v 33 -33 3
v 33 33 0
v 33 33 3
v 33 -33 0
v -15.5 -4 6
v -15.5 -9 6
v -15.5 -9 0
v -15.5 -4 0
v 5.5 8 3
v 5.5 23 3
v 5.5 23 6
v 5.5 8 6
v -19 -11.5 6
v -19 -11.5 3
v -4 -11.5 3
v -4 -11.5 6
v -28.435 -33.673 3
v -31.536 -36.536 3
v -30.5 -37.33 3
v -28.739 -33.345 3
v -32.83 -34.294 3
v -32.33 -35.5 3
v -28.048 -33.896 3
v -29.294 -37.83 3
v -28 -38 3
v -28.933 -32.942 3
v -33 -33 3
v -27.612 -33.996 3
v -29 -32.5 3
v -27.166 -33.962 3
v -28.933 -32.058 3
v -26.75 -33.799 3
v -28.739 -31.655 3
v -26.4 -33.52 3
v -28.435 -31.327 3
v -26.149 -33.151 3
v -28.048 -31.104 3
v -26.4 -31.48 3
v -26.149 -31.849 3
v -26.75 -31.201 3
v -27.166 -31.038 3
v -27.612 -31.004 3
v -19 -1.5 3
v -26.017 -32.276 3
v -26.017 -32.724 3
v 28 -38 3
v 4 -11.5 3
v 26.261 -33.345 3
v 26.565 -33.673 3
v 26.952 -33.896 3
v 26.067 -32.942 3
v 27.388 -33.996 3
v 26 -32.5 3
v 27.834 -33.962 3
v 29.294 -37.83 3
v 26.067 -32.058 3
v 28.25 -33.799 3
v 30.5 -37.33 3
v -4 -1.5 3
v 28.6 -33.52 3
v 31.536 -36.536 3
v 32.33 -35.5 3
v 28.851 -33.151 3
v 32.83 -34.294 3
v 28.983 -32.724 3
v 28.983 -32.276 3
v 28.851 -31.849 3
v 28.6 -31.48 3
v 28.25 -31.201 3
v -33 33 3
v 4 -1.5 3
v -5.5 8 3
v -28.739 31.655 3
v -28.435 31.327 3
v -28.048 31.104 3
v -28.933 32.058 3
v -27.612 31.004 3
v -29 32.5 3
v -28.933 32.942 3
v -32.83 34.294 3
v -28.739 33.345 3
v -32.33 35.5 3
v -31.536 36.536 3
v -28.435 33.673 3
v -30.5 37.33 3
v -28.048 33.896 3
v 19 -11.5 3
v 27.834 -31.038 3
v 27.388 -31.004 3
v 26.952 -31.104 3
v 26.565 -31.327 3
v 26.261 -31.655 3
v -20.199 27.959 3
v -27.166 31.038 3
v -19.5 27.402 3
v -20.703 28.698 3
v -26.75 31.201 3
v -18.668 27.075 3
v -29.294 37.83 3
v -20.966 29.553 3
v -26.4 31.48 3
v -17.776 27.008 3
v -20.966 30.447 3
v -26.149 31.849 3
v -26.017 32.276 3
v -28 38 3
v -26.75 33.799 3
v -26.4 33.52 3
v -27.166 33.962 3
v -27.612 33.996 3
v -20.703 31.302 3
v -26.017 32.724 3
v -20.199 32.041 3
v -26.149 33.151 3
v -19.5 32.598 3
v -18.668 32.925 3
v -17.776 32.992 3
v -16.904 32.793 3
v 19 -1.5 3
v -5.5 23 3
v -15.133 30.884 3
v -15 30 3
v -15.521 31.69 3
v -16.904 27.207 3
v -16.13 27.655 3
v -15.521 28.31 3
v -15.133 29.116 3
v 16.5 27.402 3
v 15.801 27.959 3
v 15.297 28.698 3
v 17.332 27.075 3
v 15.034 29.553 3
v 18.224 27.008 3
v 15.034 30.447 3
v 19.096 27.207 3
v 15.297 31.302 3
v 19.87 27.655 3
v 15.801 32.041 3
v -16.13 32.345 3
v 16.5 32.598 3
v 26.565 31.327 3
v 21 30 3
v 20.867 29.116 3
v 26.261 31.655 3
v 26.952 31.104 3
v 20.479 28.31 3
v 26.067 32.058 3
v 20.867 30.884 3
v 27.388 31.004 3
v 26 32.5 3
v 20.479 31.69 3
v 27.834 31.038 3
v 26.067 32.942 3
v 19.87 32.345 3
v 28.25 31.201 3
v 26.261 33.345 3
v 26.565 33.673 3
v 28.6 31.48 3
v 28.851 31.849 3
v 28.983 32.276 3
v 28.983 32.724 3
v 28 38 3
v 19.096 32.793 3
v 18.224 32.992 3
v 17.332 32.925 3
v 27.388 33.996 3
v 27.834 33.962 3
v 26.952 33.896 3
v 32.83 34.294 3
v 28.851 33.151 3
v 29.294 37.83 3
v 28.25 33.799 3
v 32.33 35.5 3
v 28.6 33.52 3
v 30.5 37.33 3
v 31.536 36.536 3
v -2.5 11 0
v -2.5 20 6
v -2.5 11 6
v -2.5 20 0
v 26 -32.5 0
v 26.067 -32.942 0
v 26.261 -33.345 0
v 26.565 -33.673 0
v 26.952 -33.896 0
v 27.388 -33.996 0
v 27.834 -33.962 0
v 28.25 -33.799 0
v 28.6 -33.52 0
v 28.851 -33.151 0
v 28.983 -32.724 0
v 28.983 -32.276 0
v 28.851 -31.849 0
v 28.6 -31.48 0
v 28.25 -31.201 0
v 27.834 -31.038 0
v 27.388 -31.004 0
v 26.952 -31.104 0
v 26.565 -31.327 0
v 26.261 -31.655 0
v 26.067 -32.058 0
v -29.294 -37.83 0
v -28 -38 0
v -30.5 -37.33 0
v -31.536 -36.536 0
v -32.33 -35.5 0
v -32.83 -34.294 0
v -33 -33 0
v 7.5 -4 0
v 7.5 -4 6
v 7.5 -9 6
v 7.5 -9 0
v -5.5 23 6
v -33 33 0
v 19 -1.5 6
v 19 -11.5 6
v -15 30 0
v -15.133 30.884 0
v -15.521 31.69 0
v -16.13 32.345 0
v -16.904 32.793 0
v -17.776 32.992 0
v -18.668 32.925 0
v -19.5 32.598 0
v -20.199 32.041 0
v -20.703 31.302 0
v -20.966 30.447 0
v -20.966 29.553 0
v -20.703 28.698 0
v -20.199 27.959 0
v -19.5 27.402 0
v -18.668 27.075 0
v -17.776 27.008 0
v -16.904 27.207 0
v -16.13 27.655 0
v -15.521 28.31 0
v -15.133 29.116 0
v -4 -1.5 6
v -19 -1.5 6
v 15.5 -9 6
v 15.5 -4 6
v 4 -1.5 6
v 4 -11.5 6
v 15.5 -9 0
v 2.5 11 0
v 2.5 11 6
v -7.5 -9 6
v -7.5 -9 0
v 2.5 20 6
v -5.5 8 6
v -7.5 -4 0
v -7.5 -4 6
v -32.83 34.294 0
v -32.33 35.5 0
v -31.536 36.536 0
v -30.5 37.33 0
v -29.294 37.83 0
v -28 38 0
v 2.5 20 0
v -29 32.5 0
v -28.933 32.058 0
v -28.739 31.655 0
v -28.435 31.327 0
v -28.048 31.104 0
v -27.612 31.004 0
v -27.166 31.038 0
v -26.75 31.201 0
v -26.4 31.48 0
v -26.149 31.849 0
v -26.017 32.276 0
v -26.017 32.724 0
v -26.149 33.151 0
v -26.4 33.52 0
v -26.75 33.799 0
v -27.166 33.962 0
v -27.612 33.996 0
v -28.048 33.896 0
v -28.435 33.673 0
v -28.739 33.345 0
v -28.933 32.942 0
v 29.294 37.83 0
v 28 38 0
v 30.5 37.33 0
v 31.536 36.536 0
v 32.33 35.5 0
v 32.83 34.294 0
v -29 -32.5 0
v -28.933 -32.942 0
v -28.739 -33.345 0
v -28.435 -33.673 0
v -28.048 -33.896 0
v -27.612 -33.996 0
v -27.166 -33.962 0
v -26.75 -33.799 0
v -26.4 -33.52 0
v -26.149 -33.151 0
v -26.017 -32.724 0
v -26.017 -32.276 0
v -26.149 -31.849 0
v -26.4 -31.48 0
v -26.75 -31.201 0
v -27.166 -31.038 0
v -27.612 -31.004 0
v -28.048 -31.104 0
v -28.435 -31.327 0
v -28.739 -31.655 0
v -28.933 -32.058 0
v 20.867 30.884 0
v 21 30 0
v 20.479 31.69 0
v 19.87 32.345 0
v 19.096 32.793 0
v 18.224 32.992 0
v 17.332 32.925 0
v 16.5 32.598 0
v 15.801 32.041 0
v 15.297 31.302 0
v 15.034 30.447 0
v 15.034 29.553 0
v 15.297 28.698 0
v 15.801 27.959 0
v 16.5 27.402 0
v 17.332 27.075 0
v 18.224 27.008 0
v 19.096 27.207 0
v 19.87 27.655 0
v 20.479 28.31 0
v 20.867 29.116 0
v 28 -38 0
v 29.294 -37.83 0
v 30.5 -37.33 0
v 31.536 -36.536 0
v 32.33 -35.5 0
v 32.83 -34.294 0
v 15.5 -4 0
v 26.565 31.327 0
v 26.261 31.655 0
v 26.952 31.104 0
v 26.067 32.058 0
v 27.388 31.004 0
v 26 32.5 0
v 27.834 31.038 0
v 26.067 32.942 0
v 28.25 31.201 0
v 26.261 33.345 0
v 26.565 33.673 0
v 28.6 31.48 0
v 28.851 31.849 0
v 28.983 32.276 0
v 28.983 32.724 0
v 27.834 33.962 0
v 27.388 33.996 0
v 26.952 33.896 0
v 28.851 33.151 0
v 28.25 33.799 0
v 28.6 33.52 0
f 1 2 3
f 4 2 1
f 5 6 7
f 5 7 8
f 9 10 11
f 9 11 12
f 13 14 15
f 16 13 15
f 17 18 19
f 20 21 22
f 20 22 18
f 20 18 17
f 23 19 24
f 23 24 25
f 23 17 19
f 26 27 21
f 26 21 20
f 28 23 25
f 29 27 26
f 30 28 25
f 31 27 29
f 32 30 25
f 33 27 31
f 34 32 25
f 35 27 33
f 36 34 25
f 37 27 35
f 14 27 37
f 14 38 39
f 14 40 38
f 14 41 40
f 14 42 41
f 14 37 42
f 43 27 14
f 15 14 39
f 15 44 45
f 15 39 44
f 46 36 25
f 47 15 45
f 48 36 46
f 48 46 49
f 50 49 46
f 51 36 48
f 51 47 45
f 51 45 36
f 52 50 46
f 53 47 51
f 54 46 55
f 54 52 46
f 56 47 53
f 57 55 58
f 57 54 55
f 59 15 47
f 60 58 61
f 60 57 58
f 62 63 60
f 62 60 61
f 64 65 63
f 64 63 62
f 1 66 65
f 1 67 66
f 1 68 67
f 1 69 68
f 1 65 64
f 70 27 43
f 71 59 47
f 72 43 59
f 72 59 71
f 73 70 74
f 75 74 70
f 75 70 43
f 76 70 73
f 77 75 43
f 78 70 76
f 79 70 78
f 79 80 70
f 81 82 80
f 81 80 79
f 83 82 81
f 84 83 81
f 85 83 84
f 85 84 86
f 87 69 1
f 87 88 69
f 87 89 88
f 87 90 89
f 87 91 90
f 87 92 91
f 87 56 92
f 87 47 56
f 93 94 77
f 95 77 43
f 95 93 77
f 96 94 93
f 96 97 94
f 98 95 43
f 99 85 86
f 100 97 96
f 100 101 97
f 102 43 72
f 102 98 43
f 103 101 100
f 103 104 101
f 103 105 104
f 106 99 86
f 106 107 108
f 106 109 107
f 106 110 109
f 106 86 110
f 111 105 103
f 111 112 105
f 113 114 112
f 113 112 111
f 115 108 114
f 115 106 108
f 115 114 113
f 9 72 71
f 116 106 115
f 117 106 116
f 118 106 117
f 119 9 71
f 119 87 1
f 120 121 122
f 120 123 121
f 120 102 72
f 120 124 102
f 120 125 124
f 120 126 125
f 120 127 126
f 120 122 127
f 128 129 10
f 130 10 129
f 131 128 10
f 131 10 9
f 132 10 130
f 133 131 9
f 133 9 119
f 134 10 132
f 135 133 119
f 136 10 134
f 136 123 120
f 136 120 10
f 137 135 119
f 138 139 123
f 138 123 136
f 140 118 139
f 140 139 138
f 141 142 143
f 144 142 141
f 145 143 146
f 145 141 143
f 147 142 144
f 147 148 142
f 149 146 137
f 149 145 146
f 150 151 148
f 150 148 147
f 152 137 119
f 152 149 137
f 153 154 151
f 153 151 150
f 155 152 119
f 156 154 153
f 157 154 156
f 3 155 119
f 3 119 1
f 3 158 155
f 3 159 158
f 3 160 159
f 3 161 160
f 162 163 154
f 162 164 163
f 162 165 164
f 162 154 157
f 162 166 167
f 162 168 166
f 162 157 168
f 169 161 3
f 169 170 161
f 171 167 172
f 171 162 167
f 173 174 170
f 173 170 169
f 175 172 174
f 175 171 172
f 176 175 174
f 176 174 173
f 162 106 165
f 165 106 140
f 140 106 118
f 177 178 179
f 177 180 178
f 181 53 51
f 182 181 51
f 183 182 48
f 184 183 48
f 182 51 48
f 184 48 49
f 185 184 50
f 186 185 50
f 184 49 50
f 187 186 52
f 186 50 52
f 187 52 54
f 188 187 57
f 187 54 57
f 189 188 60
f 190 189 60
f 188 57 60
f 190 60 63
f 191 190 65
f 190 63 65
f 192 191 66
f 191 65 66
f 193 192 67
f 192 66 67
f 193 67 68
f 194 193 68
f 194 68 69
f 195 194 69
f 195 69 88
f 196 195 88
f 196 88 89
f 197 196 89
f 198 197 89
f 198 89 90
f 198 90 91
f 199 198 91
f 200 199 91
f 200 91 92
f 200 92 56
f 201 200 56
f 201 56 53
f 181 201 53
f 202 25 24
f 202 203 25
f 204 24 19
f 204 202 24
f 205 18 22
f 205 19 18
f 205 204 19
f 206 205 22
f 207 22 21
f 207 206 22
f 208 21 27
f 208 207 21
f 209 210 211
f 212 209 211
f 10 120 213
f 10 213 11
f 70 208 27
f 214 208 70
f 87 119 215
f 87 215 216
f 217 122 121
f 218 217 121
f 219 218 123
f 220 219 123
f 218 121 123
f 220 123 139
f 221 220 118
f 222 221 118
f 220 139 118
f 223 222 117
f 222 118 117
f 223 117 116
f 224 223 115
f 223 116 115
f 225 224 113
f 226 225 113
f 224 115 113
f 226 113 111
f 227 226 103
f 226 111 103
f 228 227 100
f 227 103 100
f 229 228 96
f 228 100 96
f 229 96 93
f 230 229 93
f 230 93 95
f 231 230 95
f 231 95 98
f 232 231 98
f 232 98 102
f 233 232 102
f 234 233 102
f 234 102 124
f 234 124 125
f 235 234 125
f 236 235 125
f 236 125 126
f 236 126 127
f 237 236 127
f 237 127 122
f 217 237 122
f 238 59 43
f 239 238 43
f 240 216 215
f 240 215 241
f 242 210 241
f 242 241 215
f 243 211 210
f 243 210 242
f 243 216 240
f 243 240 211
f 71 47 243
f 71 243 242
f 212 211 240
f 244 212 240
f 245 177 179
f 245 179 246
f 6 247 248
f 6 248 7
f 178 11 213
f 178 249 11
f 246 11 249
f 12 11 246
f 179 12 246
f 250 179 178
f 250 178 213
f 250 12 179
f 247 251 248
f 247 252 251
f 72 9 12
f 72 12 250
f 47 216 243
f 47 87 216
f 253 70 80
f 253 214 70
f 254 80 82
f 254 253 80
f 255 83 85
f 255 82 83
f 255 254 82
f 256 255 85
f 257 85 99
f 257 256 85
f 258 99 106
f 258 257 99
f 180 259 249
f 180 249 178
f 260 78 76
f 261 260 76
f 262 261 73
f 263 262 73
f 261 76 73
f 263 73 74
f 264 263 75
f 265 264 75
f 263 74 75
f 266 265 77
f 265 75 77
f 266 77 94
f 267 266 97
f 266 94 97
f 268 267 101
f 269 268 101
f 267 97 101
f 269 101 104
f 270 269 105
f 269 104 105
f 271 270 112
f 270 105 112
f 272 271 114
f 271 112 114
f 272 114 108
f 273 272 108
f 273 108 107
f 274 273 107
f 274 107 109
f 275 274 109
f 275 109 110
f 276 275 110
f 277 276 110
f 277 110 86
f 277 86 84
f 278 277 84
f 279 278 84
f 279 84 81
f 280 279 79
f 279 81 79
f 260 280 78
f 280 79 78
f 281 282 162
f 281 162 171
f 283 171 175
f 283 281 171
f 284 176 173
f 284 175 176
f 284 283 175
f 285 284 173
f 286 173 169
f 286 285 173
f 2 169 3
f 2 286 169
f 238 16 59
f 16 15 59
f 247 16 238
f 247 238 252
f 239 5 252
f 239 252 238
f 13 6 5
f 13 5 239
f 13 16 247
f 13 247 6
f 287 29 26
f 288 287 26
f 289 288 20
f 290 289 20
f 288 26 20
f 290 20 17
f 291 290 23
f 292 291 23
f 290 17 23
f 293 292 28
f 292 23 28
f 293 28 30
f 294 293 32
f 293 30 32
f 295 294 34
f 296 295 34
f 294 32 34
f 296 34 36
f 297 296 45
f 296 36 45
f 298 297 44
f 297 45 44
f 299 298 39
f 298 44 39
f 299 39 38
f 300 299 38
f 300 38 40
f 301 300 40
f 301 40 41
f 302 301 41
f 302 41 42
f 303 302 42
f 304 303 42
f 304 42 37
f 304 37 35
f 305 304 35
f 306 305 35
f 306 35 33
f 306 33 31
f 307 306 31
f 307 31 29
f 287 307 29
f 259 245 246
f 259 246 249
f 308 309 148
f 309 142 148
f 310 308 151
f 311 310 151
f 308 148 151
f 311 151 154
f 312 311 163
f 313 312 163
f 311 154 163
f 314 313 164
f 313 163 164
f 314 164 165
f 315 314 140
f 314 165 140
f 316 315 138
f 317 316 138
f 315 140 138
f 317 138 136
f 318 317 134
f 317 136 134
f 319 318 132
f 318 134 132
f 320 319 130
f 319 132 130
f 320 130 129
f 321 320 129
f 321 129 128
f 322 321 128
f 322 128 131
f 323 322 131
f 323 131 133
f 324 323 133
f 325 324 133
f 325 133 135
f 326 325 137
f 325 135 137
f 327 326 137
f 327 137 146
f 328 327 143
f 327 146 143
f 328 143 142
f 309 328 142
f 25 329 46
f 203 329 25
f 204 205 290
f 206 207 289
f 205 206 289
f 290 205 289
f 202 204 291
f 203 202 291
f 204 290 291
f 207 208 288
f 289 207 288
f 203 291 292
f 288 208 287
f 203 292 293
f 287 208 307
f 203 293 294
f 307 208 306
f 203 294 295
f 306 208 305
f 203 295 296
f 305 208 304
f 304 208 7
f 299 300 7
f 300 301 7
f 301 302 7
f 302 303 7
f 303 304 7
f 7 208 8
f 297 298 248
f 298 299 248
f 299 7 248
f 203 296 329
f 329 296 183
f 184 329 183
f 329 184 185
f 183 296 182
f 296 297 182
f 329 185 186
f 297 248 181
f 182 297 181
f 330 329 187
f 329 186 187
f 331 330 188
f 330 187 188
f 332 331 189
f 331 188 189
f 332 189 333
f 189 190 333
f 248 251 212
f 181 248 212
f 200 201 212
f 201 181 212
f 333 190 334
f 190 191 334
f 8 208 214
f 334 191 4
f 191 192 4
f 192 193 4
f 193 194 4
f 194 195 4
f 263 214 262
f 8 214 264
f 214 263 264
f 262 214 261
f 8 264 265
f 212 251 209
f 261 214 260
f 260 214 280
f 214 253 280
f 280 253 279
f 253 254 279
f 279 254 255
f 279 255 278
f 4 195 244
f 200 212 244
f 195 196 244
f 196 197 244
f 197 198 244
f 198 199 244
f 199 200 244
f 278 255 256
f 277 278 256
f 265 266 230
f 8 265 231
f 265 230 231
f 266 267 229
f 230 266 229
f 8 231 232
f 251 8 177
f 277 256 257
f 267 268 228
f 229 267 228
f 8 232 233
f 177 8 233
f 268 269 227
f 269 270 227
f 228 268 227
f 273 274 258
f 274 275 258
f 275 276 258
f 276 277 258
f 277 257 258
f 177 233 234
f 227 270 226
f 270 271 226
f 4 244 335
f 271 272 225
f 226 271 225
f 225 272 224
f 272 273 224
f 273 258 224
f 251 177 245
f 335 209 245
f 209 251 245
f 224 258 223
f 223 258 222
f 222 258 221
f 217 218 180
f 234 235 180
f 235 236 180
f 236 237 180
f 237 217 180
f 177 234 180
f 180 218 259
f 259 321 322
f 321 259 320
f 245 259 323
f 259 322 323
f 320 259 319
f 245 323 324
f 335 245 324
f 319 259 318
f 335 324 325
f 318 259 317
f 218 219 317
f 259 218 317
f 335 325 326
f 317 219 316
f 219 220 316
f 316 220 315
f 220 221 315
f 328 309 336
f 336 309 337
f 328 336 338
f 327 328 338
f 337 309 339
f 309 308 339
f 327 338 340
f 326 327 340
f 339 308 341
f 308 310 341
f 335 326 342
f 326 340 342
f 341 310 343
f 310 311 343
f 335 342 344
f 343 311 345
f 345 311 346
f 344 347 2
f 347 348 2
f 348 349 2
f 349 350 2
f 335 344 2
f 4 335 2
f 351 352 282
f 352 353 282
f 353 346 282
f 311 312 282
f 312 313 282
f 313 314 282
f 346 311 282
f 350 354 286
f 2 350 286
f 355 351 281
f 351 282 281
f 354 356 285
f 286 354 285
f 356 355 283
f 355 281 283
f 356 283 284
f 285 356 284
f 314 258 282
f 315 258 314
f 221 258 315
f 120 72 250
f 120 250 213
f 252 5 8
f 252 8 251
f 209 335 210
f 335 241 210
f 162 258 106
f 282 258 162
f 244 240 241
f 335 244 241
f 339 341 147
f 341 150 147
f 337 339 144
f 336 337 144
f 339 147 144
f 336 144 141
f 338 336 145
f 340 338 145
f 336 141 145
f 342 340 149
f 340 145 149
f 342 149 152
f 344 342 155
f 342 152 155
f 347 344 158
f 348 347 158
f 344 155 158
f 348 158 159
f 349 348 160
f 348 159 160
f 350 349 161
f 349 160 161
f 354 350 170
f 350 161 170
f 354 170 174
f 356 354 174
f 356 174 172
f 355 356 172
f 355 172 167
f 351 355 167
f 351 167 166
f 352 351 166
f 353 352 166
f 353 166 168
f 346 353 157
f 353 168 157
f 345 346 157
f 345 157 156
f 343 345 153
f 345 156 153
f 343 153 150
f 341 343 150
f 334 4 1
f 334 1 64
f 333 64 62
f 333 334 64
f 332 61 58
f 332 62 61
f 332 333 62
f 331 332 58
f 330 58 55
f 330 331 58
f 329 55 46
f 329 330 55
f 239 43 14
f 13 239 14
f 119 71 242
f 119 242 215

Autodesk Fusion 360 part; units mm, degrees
sketch "Sketch1" plane through (0, 0, 0) normal (0, 0, 1) x (1, 0, 0) in component "Upper Layer"
  line L0 (30, -35) -> (-30, -35)
  line L1 (-30, -35) -> (-30, 35)
  line L2 (-30, 35) -> (30, 35)
  line L3 (30, 35) -> (30, -35)
  line L4 (30, -35) -> (-30, 35) construction
  line L5 (-30, -35) -> (30, 35) construction
  line L6 (28, -38) -> (-28, -38)
  line L7 (-33, -33) -> (-33, 33)
  line L8 (-28, 38) -> (28, 38)
  line L9 (33, 33) -> (33, -33)
  line L10 (33, -38) -> (-33, 38) construction
  line L11 (-33, -38) -> (33, 38) construction
  arc A0 (-28, 38) -> (-33, 33) centre (-28, 33) ccw
  arc A1 (33, 33) -> (28, 38) centre (28, 33) ccw
  arc A2 (-33, -33) -> (-28, -38) centre (-28, -33) ccw
  arc A3 (28, -38) -> (33, -33) centre (28, -33) ccw
  dimension "d1" = 60
  dimension "d2" = 70
  dimension "d3" = 66
  dimension "d4" = 76
  dimension "d51" = 5
  dimension "d52" = 5
  dimension "d53" = 5
  dimension "d54" = 5
extrude "Extrude1" add sketch "Sketch1" along normal blind 3 contours L0 L1 L2 L3 | L6 L7 L8 L9 A0 A1 A2 A3 in component "Upper Layer"
sketch "Sketch2" plane through (0, 0, 3) normal (0, 0, 1) x (-1, 0, 0) in component "Upper Layer"
  line L0 (-28, -38) -> (28, -38)
  line L1 (33, -33) -> (33, 33)
  line L2 (28, 38) -> (-28, 38)
  line L3 (-33, 33) -> (-33, -33)
  line L4 (-30, 35) -> (30, 35)
  line L5 (30, 35) -> (30, -35)
  line L6 (30, -35) -> (-30, -35)
  line L7 (-30, -35) -> (-30, 35)
  line L8 (-30, 35) -> (30, -35) construction
  line L9 (30, 35) -> (-30, -35) construction
  line L10 (0, 35) -> (0, -35) construction
  line L11 (2.5, -11) -> (-2.5, -11)
  line L12 (-2.5, -11) -> (-2.5, -20)
  line L13 (-2.5, -20) -> (2.5, -20)
  line L14 (2.5, -20) -> (2.5, -11)
  line L15 (2.5, -11) -> (-2.5, -20) construction
  line L16 (-2.5, -11) -> (2.5, -20) construction
  line L17 (0, -11) -> (0, 9) construction
  line L18 (0, 9) -> (-7.5, 9) construction
  line L19 (-7.5, 9) -> (-15.5, 9)
  line L20 (-15.5, 9) -> (-15.5, 4)
  line L21 (-15.5, 4) -> (-7.5, 4)
  line L22 (-7.5, 4) -> (-7.5, 9)
  line L23 (15.5, 4) -> (7.5, 4)
  line L24 (7.5, 4) -> (7.5, 9)
  line L25 (15.5, 9) -> (15.5, 4)
  line L26 (7.5, 9) -> (15.5, 9)
  line L27 (-5.5, -8) -> (5.5, -8)
  line L28 (5.5, -8) -> (5.5, -23)
  line L29 (5.5, -23) -> (-5.5, -23)
  line L30 (-5.5, -23) -> (-5.5, -8)
  line L31 (-5.5, -8) -> (5.5, -23) construction
  line L32 (5.5, -8) -> (-5.5, -23) construction
  line L33 (-11.5, 9) -> (-11.5, 4) construction
  line L34 (-7.5, 6.5) -> (-15.5, 6.5) construction
  line L35 (-19, 11.5) -> (-4, 11.5)
  line L36 (-4, 11.5) -> (-4, 1.5)
  line L37 (-4, 1.5) -> (-19, 1.5)
  line L38 (-19, 1.5) -> (-19, 11.5)
  line L39 (-19, 11.5) -> (-4, 1.5) construction
  line L40 (-4, 11.5) -> (-19, 1.5) construction
  line L41 (4, 1.5) -> (19, 1.5)
  line L42 (4, 11.5) -> (4, 1.5)
  line L43 (19, 11.5) -> (4, 11.5)
  line L44 (19, 1.5) -> (19, 11.5)
  arc A0 (33, 33) -> (28, 38) centre (28, 33) ccw
  arc A1 (-28, 38) -> (-33, 33) centre (-28, 33) ccw
  arc A2 (-33, -33) -> (-28, -38) centre (-28, -33) ccw
  arc A3 (28, -38) -> (33, -33) centre (28, -33) ccw
  point P0 (0, -15.5)
  point P1 (0, -15.5)
  point P2 (-11.5, 6.5)
  dimension "d7" = 5
  dimension "d8" = 9
  dimension "d9" = 20
  dimension "d10" = 7.5
  dimension "d11" = 8
  dimension "d12" = 5
  dimension "d13" = 11
  dimension "d14" = 15
  dimension "d15" = 15
  dimension "d16" = 10
extrude "Extrude2" cut sketch "Sketch2" against normal up to surface (3 mm away) contours L11 L12 L13 L14 in component "Upper Layer"
extrude "Extrude3" add sketch "Sketch2" along normal blind 3 contours L27 L28 L29 L30 in component "Upper Layer"
extrude "Extrude4" cut sketch "Sketch2" against normal up to surface (3 mm away) contours L19 L20 L21 L22 | L23 L24 L25 L26 in component "Upper Layer"
extrude "Extrude5" add sketch "Sketch2" along normal blind 3 contours L35 L36 L37 L38 | L41 L42 L43 L44 in component "Upper Layer"
sketch "Sketch2 (2)" plane through (0, 0, -8.9199) normal (0, 0, -1) x (1, 0, 0)
  line L0 (22.45, -32.5) -> (22.45, -27.6)
  line L1 (22.45, -27.6) -> (17.55, -27.6)
  line L2 (17.55, -27.6) -> (17.55, -32.5)
  line L3 (17.55, -32.5) -> (22.45, -32.5)
  line L4 (-17.55, -32.45) -> (-17.55, -27.55)
  line L5 (-17.55, -27.55) -> (-22.45, -27.55)
  line L6 (-22.45, -27.55) -> (-22.45, -32.45)
  line L7 (-22.45, -32.45) -> (-17.55, -32.45)
sketch "Sketch4" plane through (0, 0, 3) normal (0, 0, 1) x (1, 0, 0) in component "Upper Layer"
  line L0 (0, 30) -> (-18, 30) construction
  circle A0 centre (-18, 30) radius 3
  line L1 (-18, 30) -> (-15, 30)
  line L2 (-18, 30) -> (-7.5877, 30) construction
  line L3 (-18, 30) -> (18, 30) construction
  circle A1 centre (18, 30) radius 3
  dimension "d37" = 6
  dimension "d38" = 36
  dimension "d39" = 6
  dimension "d50" = 18
extrude "Extrude9" cut sketch "Sketch4" against normal up to surface (3 mm away) in component "Upper Layer"
sketch "Sketch3" plane through (0, 0, 3) normal (0, 0, 1) x (-1, 0, 0)
  line L0 (30, 35) -> (27.5, 35) construction
  line L1 (30, 35) -> (30, 32.5) construction
  circle A0 centre (27.5, 32.5) radius 2.5
  line L2 (40, 0) -> (-40, 0)
  line L3 (0, -45) -> (0, 47.452)
  circle A1 centre (27.5, -32.5) radius 2.5
  circle A2 centre (-27.5, -32.5) radius 2.5
  circle A3 centre (-27.5, 32.5) radius 2.5
  circle A4 centre (27.5, -32.5) radius 1.5
  circle A5 centre (27.5, 32.5) radius 1.5
  circle A6 centre (-27.5, -32.5) radius 1.5
  circle A7 centre (-27.5, 32.5) radius 1.5
  dimension "d42" = 2.5
  dimension "d43" = 2.5
  dimension "d44" = 3
  dimension "d45" = 3
  dimension "d46" = 3
  dimension "d47" = 3
extrude "Extrude10" cut sketch "Sketch3" against normal blind 3 contours A4 | A5 | A6 | A7 in component "Upper Layer"
component "Upper Layer" placed x (1, 0, 0) y (0, 1, 0) z (0, 0, 1) at (0, 0, 0)
equation "d10 = ( 15 / 2 ) * 1 mm"
